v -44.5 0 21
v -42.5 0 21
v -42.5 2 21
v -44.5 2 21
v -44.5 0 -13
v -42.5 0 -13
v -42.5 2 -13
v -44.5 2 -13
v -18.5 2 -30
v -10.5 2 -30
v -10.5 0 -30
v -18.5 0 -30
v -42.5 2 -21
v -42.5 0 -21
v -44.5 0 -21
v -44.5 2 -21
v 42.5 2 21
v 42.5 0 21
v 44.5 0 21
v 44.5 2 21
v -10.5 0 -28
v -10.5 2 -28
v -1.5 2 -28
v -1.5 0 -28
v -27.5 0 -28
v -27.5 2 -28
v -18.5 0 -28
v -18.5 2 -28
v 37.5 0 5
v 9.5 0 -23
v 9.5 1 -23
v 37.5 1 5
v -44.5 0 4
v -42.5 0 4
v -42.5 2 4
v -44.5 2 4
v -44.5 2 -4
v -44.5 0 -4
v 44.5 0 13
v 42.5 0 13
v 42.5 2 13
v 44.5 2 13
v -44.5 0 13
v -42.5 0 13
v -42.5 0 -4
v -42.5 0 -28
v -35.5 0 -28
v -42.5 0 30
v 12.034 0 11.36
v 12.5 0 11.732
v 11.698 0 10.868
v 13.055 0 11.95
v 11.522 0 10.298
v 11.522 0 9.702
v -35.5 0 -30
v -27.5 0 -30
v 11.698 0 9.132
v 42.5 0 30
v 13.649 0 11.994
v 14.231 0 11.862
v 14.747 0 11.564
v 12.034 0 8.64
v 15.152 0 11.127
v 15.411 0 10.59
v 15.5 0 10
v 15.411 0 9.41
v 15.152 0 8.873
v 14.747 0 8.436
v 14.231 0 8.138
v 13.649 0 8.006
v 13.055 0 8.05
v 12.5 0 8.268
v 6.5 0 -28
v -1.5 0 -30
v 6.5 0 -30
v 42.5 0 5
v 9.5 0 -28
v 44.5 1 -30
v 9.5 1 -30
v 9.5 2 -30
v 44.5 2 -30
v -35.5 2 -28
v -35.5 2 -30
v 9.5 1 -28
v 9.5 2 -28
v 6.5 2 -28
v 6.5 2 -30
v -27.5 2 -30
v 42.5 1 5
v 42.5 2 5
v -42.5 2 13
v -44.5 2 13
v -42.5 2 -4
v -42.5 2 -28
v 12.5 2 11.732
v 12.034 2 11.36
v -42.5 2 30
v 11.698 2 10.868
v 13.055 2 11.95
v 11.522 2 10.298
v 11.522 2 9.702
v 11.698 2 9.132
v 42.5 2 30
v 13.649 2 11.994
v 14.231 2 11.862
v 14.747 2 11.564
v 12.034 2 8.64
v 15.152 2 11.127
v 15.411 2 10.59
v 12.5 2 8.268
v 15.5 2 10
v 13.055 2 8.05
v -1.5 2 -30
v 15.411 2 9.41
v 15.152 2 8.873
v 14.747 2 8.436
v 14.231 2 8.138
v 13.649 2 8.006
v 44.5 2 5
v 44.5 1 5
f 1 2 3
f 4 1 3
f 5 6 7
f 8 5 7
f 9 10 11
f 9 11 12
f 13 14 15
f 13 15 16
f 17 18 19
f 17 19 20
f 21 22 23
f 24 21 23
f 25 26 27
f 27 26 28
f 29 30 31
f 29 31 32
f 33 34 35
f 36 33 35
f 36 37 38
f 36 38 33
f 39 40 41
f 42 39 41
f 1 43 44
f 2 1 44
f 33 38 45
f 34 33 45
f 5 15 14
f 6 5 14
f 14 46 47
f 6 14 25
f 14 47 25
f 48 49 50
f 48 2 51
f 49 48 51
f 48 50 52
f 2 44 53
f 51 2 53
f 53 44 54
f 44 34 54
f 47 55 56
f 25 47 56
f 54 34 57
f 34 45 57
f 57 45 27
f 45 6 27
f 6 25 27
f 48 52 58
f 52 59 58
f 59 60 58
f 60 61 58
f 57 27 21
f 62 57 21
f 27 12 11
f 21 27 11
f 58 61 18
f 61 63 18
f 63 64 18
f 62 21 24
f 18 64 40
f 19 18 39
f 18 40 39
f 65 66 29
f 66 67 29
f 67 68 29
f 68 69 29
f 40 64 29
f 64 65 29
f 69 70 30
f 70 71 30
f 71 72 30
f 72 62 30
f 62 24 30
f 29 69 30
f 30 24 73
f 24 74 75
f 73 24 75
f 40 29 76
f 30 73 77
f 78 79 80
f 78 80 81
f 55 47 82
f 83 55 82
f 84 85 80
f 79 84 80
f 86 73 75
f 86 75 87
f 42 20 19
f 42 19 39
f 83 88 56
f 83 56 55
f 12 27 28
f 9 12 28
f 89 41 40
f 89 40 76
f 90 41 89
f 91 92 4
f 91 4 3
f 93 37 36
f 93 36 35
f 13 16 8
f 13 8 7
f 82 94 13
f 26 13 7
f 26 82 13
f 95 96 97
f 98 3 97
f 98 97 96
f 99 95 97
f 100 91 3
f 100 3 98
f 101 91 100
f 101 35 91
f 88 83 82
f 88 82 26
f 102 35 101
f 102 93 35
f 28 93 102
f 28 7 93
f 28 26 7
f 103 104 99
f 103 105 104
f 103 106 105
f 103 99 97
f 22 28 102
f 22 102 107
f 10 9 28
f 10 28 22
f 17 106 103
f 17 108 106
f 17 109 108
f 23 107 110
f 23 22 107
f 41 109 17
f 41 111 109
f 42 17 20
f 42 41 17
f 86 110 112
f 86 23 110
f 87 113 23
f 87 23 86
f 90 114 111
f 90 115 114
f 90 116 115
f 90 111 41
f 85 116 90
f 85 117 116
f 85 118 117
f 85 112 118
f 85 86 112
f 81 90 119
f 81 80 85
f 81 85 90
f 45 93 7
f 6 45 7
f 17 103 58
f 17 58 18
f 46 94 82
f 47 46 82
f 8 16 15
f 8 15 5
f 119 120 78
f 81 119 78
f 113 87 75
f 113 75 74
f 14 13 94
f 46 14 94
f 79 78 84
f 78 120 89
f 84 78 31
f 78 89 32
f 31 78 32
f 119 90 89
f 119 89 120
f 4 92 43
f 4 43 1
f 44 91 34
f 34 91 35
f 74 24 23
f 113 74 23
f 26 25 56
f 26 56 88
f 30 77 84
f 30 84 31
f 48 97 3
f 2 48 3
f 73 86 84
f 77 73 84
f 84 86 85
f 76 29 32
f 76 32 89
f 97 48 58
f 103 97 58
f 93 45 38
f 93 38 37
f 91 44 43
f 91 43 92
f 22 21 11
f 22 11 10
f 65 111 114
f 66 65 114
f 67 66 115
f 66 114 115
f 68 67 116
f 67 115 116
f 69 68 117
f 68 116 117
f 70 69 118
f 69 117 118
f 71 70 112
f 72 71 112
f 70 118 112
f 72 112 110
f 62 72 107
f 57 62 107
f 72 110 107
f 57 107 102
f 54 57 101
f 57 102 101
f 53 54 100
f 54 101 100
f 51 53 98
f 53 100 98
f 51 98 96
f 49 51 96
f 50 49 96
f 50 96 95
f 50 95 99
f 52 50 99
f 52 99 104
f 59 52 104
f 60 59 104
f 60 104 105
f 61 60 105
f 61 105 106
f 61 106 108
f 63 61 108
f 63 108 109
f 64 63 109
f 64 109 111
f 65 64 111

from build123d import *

# Parameters (mm, degrees)
SKETCH_370_W           = 89
SKETCH_370_H           = 60
EXTRUDE_438_DEPTH      = 2
CUT_EXTRUDE_684_DEPTH  = 2
SKETCH_734_W           = 2
SKETCH_734_H           = 25
CUT_EXTRUDE_885_DEPTH  = 2
SKETCH_933_W           = 8
SKETCH_933_H           = 2
EXTRUDE_1139_DEPTH     = 2
SKETCH_1188_W          = 8
SKETCH_1188_H          = 2
EXTRUDE_1389_DEPTH     = 2
SKETCH_1437_W          = 8
SKETCH_1437_H          = 2
EXTRUDE_1598_DEPTH     = 2
CUT_EXTRUDE_2168_DEPTH = 1
SKETCH_2222_R          = 2
CUT_EXTRUDE_2716_DEPTH = 3


with BuildPart() as part:
    # Sketch 370 → Extrude 438 (new body)
    with BuildSketch(Plane(origin=(0, 0, 0), x_dir=(1, 0, 0), z_dir=(0, 1, 0))):
        Rectangle(SKETCH_370_W, SKETCH_370_H)
    extrude(amount=EXTRUDE_438_DEPTH)

    # Sketch 488 → Cut-Extrude 684 (cut)
    with BuildSketch(Plane(origin=(0, 2, 0), x_dir=(1, 0, 0), z_dir=(0, 1, 0))):
        Polygon((-44.5, -30), (-42.5, -30), (-42.5, 28), (9.5, 28), (9.5, 30), (-44.5, 30), align=None)
    extrude(amount=-CUT_EXTRUDE_684_DEPTH, mode=Mode.SUBTRACT)

    # Sketch 734 → Cut-Extrude 885 (cut)
    with BuildSketch(Plane(origin=(0, 2, 0), x_dir=(1, 0, 0), z_dir=(0, 1, 0))):
        with Locations((43.5, -17.5)):
            Rectangle(SKETCH_734_W, SKETCH_734_H)
    extrude(amount=-CUT_EXTRUDE_885_DEPTH, mode=Mode.SUBTRACT)

    # Sketch 933 → Extrude 1139 (add)
    with BuildSketch(Plane.ZY.offset(42.5)):
        with Locations((17, 1)):
            Rectangle(SKETCH_933_W, SKETCH_933_H)
        with Locations((0, 1)):
            Rectangle(SKETCH_933_W, SKETCH_933_H)
        with Locations((-17, 1)):
            Rectangle(SKETCH_933_W, SKETCH_933_H)
    extrude(amount=EXTRUDE_1139_DEPTH)

    # Sketch 1188 → Extrude 1389 (add)
    with BuildSketch(Plane(origin=(0, 0, -28), x_dir=(-1, 0, 0), z_dir=(0, 0, -1))):
        with Locations((31.5, 1)):
            Rectangle(SKETCH_1188_W, SKETCH_1188_H)
        with Locations((14.5, 1)):
            Rectangle(SKETCH_1188_W, SKETCH_1188_H)
        with Locations((-2.5, 1)):
            Rectangle(SKETCH_1188_W, SKETCH_1188_H)
    extrude(amount=EXTRUDE_1389_DEPTH)

    # Sketch 1437 → Extrude 1598 (add)
    with BuildSketch(Plane(origin=(42.5, 0, 0), x_dir=(0, 0, -1), z_dir=(1, 0, 0))):
        with Locations((-17, 1)):
            Rectangle(SKETCH_1437_W, SKETCH_1437_H)
    extrude(amount=EXTRUDE_1598_DEPTH)

    # Sketch 1650 → Cut-Extrude 2168 (cut)
    with BuildSketch(Plane.XZ):
        Polygon((44.5, -30), (9.5, -30), (9.5, -23), (37.5, 5), (44.5, 5), align=None)
    extrude(amount=-CUT_EXTRUDE_2168_DEPTH, mode=Mode.SUBTRACT)

    # Sketch 2222 → Cut-Extrude 2716 (cut, through all)
    with BuildSketch(Plane(origin=(0, 2, 0), x_dir=(1, 0, 0), z_dir=(0, 1, 0))):
        with Locations((13.5, -10)):
            Circle(SKETCH_2222_R)
    extrude(amount=-CUT_EXTRUDE_2716_DEPTH, mode=Mode.SUBTRACT)


solid = part.part
